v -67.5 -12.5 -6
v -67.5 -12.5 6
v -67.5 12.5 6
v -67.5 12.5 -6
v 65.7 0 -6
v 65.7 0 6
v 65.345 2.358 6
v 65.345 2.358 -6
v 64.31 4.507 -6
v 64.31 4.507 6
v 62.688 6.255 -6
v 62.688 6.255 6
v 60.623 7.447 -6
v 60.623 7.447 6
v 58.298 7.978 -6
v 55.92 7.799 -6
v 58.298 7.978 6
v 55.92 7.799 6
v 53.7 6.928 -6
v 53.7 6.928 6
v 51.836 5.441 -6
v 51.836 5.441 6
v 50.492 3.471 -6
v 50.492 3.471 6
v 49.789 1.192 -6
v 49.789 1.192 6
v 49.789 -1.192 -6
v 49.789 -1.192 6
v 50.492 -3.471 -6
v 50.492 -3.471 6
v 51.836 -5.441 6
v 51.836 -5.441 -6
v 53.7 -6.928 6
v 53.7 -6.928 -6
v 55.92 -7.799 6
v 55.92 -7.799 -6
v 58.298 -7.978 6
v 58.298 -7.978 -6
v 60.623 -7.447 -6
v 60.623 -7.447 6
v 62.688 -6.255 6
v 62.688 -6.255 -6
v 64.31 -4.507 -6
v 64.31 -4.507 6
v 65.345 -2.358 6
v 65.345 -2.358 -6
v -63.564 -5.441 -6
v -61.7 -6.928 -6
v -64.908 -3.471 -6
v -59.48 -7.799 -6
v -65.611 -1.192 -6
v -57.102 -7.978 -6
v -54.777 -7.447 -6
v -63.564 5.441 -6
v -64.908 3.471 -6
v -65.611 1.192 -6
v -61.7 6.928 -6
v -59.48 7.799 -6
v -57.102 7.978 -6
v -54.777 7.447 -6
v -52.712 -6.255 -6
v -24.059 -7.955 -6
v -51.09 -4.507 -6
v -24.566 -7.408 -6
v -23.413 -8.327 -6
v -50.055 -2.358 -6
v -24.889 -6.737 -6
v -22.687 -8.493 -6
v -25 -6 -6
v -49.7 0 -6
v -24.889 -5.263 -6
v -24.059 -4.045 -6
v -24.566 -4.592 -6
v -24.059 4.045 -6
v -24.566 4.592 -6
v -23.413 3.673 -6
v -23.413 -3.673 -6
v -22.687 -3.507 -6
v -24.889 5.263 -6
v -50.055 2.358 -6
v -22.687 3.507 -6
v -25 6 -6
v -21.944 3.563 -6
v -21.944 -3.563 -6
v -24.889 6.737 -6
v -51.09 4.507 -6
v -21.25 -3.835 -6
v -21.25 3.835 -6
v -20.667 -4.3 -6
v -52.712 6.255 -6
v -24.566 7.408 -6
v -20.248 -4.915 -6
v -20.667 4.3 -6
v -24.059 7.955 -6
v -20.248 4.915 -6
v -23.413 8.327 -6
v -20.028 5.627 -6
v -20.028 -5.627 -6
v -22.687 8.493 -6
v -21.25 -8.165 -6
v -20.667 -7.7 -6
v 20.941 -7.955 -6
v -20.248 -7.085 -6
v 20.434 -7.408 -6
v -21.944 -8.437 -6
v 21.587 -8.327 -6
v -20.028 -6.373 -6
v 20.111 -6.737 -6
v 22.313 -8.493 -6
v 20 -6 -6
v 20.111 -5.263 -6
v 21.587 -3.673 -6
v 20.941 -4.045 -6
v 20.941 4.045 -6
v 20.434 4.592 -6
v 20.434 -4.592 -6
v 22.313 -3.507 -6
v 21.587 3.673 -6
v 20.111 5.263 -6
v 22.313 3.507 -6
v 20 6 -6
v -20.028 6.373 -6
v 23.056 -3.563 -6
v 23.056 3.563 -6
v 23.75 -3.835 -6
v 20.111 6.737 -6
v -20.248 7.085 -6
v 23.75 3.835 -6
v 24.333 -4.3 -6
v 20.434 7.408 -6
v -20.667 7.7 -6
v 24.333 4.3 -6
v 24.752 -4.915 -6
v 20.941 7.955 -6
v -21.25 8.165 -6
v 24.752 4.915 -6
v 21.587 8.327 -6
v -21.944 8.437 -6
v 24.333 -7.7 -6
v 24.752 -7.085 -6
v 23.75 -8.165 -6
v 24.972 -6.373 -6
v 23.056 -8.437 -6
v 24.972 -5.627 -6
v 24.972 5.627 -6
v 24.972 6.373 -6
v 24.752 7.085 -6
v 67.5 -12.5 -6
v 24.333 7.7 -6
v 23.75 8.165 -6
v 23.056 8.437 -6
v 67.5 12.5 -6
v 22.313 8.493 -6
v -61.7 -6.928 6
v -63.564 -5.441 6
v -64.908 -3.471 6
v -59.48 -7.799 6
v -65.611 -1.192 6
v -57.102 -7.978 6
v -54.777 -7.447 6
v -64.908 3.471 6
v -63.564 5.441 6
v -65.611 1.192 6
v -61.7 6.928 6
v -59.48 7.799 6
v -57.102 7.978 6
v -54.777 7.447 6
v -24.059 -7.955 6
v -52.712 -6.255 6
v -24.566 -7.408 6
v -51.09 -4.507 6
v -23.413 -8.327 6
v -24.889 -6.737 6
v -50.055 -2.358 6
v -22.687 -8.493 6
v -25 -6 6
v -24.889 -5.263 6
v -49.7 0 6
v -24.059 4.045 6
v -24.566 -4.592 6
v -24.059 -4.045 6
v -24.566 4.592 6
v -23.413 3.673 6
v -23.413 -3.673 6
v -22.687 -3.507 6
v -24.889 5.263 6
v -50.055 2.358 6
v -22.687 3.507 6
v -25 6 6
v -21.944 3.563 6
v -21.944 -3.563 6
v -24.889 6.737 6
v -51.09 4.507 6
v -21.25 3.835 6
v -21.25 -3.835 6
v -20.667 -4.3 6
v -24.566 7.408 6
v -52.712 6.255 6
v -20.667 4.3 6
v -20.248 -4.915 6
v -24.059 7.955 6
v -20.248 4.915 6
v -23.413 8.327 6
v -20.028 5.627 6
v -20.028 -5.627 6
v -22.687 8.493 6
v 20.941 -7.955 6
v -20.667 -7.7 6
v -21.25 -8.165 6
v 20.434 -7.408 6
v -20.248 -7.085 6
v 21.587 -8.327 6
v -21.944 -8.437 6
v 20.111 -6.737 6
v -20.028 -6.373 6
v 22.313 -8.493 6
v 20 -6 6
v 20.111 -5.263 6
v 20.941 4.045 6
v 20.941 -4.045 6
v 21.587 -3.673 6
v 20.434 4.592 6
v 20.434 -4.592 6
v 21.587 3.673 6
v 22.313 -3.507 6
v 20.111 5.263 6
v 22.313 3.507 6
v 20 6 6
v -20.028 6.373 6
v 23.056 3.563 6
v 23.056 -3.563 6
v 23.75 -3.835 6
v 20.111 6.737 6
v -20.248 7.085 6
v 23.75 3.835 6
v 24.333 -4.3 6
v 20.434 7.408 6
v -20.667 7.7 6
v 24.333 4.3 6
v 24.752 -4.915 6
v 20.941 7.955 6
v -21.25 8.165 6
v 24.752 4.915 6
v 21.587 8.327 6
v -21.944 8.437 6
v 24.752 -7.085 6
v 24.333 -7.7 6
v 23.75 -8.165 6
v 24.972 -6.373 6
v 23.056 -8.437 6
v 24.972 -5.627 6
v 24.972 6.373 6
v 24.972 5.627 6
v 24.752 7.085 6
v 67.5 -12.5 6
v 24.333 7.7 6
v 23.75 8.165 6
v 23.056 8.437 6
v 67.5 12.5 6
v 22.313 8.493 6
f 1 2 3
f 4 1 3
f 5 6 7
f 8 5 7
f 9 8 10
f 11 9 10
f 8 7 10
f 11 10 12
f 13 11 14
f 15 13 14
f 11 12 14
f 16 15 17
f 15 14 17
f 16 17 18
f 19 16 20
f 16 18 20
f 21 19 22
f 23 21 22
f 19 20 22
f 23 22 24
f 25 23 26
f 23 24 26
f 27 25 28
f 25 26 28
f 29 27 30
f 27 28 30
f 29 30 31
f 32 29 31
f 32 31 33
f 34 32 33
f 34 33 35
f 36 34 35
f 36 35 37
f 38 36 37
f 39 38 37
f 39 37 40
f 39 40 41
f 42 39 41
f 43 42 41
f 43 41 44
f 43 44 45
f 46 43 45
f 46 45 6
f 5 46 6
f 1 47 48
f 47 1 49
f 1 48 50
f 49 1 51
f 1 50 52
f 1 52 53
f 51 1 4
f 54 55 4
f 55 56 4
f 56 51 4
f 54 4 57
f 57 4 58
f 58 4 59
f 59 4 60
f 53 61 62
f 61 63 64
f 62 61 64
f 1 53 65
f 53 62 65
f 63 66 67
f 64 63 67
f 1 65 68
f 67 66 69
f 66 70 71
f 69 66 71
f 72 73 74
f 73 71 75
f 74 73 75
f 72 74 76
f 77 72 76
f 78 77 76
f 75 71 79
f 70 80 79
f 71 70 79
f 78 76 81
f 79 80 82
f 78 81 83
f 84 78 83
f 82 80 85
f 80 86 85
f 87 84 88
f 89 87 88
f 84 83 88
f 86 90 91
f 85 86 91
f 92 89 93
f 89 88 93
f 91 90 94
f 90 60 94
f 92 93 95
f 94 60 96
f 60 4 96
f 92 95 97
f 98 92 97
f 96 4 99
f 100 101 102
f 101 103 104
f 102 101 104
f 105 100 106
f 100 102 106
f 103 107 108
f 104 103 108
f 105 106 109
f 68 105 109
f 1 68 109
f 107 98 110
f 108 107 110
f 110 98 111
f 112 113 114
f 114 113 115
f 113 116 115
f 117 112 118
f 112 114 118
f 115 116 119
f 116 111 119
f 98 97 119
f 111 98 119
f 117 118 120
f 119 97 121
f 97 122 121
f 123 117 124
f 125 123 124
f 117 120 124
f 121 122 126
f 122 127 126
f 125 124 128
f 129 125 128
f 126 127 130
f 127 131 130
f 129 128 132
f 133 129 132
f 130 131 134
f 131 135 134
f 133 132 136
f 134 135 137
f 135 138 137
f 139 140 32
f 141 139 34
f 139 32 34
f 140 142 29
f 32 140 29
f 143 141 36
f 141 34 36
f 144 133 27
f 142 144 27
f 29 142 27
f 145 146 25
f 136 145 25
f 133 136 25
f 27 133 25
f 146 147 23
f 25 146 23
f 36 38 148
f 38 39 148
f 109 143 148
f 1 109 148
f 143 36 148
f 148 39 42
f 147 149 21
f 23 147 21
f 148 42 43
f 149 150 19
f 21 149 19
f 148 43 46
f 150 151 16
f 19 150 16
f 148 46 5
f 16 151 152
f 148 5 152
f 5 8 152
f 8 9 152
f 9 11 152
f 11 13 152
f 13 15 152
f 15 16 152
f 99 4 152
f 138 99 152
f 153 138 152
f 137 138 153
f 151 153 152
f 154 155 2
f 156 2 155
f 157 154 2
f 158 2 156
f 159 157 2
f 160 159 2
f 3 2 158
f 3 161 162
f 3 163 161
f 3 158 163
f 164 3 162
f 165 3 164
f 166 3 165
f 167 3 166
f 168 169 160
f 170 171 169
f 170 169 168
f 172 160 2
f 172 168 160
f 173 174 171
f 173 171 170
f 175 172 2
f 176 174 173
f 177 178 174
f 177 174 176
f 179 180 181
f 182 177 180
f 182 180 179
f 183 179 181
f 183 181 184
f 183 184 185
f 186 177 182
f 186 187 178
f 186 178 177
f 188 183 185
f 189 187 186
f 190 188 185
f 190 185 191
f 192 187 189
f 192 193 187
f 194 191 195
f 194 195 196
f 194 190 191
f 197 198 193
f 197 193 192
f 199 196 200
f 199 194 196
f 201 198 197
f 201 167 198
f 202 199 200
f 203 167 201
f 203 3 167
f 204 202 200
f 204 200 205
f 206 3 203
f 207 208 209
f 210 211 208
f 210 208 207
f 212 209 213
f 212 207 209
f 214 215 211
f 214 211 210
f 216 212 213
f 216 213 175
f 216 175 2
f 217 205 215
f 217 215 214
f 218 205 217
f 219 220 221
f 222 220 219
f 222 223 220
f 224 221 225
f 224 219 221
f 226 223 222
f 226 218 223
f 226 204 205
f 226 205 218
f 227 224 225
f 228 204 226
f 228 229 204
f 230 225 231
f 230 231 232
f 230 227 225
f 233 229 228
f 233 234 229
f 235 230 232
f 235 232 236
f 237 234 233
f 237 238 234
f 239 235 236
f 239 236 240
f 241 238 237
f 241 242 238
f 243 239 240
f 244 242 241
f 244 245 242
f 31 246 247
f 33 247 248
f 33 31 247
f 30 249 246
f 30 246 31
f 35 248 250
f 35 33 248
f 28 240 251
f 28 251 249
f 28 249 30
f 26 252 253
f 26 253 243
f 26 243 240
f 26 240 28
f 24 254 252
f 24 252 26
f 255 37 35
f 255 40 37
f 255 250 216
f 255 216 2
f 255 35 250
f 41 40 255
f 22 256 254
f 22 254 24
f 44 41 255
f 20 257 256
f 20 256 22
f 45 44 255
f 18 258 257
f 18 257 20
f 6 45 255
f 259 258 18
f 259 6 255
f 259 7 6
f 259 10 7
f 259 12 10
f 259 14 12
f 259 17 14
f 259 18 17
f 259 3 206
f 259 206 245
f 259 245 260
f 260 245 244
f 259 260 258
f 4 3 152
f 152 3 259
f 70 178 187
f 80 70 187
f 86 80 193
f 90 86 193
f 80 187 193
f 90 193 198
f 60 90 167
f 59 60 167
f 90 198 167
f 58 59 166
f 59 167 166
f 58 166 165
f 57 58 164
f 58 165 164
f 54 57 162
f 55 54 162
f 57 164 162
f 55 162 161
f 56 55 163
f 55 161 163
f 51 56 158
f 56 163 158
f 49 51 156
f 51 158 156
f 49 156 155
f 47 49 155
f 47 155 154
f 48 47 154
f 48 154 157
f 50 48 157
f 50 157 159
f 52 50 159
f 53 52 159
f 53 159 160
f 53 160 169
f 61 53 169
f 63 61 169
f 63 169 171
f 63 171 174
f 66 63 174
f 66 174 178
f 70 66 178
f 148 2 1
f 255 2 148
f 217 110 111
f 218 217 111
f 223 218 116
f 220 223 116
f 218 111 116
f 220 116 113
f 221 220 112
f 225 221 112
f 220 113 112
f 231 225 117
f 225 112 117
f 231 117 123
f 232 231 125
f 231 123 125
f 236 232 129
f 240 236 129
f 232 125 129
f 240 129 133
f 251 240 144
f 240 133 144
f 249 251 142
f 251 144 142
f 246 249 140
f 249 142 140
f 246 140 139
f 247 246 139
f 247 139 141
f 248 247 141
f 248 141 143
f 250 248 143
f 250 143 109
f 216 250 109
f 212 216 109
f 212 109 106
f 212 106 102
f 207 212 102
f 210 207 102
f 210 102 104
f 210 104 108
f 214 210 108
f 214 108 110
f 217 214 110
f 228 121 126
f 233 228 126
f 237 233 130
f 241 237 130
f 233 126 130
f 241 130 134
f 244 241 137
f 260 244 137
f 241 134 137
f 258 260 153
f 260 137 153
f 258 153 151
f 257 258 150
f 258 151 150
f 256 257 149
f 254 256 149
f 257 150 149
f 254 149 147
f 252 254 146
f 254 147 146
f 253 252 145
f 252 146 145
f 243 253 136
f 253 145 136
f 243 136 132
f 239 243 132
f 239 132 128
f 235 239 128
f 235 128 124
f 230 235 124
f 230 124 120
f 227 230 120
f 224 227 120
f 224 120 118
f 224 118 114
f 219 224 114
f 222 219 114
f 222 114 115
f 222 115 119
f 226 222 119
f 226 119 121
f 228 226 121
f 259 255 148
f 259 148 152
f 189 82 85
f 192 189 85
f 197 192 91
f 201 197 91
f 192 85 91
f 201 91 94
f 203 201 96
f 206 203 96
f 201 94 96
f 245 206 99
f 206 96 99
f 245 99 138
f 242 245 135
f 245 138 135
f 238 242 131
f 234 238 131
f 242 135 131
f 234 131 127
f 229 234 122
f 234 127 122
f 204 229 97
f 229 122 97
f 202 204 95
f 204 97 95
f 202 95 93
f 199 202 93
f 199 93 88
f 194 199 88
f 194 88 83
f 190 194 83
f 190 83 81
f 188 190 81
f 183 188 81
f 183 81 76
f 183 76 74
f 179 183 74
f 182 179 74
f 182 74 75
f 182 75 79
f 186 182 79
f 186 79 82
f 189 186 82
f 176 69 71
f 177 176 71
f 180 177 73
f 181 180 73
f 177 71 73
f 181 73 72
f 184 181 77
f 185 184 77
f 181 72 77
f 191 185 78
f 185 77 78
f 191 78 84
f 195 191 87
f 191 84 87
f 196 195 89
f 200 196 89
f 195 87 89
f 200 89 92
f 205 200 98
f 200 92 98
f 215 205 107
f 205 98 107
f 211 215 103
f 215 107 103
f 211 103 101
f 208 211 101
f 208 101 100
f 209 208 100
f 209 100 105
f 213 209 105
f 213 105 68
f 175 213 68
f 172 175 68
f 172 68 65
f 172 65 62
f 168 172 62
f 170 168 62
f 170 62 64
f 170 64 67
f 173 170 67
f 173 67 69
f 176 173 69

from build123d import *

# Parameters (mm, degrees)
SKETCH1_W                   = 135
SKETCH1_H                   = 25
BOSS_EXTRUDE1_DEPTH         = 6
TAP_DRILL_FOR_M6X1_0_TAP1_D = 5
SKETCH2_R                   = 8
CUT_EXTRUDE1_DEPTH          = 70.688593041


with BuildPart() as part:
    # Sketch1 → Boss-Extrude1 (new, symmetric)
    with BuildSketch(Plane.XY):
        Rectangle(SKETCH1_W, SKETCH1_H)
    extrude(amount=BOSS_EXTRUDE1_DEPTH, both=True)

    # Tap Drill for M6x1.0 Tap1 (through all)
    with Locations(Plane.XY.offset(6)):
        with Locations((-22.5, 6), (-22.5, -6), (22.5, 6), (22.5, -6)):
            Hole(TAP_DRILL_FOR_M6X1_0_TAP1_D / 2)

    # Sketch2 → Cut-Extrude1 (cut, through all)
    with BuildSketch(Plane.XY.offset(6)):
        with Locations((-57.7, 0)):
            Circle(SKETCH2_R)
        with Locations((57.7, 0)):
            Circle(SKETCH2_R)
    extrude(amount=-CUT_EXTRUDE1_DEPTH, mode=Mode.SUBTRACT)


solid = part.part
